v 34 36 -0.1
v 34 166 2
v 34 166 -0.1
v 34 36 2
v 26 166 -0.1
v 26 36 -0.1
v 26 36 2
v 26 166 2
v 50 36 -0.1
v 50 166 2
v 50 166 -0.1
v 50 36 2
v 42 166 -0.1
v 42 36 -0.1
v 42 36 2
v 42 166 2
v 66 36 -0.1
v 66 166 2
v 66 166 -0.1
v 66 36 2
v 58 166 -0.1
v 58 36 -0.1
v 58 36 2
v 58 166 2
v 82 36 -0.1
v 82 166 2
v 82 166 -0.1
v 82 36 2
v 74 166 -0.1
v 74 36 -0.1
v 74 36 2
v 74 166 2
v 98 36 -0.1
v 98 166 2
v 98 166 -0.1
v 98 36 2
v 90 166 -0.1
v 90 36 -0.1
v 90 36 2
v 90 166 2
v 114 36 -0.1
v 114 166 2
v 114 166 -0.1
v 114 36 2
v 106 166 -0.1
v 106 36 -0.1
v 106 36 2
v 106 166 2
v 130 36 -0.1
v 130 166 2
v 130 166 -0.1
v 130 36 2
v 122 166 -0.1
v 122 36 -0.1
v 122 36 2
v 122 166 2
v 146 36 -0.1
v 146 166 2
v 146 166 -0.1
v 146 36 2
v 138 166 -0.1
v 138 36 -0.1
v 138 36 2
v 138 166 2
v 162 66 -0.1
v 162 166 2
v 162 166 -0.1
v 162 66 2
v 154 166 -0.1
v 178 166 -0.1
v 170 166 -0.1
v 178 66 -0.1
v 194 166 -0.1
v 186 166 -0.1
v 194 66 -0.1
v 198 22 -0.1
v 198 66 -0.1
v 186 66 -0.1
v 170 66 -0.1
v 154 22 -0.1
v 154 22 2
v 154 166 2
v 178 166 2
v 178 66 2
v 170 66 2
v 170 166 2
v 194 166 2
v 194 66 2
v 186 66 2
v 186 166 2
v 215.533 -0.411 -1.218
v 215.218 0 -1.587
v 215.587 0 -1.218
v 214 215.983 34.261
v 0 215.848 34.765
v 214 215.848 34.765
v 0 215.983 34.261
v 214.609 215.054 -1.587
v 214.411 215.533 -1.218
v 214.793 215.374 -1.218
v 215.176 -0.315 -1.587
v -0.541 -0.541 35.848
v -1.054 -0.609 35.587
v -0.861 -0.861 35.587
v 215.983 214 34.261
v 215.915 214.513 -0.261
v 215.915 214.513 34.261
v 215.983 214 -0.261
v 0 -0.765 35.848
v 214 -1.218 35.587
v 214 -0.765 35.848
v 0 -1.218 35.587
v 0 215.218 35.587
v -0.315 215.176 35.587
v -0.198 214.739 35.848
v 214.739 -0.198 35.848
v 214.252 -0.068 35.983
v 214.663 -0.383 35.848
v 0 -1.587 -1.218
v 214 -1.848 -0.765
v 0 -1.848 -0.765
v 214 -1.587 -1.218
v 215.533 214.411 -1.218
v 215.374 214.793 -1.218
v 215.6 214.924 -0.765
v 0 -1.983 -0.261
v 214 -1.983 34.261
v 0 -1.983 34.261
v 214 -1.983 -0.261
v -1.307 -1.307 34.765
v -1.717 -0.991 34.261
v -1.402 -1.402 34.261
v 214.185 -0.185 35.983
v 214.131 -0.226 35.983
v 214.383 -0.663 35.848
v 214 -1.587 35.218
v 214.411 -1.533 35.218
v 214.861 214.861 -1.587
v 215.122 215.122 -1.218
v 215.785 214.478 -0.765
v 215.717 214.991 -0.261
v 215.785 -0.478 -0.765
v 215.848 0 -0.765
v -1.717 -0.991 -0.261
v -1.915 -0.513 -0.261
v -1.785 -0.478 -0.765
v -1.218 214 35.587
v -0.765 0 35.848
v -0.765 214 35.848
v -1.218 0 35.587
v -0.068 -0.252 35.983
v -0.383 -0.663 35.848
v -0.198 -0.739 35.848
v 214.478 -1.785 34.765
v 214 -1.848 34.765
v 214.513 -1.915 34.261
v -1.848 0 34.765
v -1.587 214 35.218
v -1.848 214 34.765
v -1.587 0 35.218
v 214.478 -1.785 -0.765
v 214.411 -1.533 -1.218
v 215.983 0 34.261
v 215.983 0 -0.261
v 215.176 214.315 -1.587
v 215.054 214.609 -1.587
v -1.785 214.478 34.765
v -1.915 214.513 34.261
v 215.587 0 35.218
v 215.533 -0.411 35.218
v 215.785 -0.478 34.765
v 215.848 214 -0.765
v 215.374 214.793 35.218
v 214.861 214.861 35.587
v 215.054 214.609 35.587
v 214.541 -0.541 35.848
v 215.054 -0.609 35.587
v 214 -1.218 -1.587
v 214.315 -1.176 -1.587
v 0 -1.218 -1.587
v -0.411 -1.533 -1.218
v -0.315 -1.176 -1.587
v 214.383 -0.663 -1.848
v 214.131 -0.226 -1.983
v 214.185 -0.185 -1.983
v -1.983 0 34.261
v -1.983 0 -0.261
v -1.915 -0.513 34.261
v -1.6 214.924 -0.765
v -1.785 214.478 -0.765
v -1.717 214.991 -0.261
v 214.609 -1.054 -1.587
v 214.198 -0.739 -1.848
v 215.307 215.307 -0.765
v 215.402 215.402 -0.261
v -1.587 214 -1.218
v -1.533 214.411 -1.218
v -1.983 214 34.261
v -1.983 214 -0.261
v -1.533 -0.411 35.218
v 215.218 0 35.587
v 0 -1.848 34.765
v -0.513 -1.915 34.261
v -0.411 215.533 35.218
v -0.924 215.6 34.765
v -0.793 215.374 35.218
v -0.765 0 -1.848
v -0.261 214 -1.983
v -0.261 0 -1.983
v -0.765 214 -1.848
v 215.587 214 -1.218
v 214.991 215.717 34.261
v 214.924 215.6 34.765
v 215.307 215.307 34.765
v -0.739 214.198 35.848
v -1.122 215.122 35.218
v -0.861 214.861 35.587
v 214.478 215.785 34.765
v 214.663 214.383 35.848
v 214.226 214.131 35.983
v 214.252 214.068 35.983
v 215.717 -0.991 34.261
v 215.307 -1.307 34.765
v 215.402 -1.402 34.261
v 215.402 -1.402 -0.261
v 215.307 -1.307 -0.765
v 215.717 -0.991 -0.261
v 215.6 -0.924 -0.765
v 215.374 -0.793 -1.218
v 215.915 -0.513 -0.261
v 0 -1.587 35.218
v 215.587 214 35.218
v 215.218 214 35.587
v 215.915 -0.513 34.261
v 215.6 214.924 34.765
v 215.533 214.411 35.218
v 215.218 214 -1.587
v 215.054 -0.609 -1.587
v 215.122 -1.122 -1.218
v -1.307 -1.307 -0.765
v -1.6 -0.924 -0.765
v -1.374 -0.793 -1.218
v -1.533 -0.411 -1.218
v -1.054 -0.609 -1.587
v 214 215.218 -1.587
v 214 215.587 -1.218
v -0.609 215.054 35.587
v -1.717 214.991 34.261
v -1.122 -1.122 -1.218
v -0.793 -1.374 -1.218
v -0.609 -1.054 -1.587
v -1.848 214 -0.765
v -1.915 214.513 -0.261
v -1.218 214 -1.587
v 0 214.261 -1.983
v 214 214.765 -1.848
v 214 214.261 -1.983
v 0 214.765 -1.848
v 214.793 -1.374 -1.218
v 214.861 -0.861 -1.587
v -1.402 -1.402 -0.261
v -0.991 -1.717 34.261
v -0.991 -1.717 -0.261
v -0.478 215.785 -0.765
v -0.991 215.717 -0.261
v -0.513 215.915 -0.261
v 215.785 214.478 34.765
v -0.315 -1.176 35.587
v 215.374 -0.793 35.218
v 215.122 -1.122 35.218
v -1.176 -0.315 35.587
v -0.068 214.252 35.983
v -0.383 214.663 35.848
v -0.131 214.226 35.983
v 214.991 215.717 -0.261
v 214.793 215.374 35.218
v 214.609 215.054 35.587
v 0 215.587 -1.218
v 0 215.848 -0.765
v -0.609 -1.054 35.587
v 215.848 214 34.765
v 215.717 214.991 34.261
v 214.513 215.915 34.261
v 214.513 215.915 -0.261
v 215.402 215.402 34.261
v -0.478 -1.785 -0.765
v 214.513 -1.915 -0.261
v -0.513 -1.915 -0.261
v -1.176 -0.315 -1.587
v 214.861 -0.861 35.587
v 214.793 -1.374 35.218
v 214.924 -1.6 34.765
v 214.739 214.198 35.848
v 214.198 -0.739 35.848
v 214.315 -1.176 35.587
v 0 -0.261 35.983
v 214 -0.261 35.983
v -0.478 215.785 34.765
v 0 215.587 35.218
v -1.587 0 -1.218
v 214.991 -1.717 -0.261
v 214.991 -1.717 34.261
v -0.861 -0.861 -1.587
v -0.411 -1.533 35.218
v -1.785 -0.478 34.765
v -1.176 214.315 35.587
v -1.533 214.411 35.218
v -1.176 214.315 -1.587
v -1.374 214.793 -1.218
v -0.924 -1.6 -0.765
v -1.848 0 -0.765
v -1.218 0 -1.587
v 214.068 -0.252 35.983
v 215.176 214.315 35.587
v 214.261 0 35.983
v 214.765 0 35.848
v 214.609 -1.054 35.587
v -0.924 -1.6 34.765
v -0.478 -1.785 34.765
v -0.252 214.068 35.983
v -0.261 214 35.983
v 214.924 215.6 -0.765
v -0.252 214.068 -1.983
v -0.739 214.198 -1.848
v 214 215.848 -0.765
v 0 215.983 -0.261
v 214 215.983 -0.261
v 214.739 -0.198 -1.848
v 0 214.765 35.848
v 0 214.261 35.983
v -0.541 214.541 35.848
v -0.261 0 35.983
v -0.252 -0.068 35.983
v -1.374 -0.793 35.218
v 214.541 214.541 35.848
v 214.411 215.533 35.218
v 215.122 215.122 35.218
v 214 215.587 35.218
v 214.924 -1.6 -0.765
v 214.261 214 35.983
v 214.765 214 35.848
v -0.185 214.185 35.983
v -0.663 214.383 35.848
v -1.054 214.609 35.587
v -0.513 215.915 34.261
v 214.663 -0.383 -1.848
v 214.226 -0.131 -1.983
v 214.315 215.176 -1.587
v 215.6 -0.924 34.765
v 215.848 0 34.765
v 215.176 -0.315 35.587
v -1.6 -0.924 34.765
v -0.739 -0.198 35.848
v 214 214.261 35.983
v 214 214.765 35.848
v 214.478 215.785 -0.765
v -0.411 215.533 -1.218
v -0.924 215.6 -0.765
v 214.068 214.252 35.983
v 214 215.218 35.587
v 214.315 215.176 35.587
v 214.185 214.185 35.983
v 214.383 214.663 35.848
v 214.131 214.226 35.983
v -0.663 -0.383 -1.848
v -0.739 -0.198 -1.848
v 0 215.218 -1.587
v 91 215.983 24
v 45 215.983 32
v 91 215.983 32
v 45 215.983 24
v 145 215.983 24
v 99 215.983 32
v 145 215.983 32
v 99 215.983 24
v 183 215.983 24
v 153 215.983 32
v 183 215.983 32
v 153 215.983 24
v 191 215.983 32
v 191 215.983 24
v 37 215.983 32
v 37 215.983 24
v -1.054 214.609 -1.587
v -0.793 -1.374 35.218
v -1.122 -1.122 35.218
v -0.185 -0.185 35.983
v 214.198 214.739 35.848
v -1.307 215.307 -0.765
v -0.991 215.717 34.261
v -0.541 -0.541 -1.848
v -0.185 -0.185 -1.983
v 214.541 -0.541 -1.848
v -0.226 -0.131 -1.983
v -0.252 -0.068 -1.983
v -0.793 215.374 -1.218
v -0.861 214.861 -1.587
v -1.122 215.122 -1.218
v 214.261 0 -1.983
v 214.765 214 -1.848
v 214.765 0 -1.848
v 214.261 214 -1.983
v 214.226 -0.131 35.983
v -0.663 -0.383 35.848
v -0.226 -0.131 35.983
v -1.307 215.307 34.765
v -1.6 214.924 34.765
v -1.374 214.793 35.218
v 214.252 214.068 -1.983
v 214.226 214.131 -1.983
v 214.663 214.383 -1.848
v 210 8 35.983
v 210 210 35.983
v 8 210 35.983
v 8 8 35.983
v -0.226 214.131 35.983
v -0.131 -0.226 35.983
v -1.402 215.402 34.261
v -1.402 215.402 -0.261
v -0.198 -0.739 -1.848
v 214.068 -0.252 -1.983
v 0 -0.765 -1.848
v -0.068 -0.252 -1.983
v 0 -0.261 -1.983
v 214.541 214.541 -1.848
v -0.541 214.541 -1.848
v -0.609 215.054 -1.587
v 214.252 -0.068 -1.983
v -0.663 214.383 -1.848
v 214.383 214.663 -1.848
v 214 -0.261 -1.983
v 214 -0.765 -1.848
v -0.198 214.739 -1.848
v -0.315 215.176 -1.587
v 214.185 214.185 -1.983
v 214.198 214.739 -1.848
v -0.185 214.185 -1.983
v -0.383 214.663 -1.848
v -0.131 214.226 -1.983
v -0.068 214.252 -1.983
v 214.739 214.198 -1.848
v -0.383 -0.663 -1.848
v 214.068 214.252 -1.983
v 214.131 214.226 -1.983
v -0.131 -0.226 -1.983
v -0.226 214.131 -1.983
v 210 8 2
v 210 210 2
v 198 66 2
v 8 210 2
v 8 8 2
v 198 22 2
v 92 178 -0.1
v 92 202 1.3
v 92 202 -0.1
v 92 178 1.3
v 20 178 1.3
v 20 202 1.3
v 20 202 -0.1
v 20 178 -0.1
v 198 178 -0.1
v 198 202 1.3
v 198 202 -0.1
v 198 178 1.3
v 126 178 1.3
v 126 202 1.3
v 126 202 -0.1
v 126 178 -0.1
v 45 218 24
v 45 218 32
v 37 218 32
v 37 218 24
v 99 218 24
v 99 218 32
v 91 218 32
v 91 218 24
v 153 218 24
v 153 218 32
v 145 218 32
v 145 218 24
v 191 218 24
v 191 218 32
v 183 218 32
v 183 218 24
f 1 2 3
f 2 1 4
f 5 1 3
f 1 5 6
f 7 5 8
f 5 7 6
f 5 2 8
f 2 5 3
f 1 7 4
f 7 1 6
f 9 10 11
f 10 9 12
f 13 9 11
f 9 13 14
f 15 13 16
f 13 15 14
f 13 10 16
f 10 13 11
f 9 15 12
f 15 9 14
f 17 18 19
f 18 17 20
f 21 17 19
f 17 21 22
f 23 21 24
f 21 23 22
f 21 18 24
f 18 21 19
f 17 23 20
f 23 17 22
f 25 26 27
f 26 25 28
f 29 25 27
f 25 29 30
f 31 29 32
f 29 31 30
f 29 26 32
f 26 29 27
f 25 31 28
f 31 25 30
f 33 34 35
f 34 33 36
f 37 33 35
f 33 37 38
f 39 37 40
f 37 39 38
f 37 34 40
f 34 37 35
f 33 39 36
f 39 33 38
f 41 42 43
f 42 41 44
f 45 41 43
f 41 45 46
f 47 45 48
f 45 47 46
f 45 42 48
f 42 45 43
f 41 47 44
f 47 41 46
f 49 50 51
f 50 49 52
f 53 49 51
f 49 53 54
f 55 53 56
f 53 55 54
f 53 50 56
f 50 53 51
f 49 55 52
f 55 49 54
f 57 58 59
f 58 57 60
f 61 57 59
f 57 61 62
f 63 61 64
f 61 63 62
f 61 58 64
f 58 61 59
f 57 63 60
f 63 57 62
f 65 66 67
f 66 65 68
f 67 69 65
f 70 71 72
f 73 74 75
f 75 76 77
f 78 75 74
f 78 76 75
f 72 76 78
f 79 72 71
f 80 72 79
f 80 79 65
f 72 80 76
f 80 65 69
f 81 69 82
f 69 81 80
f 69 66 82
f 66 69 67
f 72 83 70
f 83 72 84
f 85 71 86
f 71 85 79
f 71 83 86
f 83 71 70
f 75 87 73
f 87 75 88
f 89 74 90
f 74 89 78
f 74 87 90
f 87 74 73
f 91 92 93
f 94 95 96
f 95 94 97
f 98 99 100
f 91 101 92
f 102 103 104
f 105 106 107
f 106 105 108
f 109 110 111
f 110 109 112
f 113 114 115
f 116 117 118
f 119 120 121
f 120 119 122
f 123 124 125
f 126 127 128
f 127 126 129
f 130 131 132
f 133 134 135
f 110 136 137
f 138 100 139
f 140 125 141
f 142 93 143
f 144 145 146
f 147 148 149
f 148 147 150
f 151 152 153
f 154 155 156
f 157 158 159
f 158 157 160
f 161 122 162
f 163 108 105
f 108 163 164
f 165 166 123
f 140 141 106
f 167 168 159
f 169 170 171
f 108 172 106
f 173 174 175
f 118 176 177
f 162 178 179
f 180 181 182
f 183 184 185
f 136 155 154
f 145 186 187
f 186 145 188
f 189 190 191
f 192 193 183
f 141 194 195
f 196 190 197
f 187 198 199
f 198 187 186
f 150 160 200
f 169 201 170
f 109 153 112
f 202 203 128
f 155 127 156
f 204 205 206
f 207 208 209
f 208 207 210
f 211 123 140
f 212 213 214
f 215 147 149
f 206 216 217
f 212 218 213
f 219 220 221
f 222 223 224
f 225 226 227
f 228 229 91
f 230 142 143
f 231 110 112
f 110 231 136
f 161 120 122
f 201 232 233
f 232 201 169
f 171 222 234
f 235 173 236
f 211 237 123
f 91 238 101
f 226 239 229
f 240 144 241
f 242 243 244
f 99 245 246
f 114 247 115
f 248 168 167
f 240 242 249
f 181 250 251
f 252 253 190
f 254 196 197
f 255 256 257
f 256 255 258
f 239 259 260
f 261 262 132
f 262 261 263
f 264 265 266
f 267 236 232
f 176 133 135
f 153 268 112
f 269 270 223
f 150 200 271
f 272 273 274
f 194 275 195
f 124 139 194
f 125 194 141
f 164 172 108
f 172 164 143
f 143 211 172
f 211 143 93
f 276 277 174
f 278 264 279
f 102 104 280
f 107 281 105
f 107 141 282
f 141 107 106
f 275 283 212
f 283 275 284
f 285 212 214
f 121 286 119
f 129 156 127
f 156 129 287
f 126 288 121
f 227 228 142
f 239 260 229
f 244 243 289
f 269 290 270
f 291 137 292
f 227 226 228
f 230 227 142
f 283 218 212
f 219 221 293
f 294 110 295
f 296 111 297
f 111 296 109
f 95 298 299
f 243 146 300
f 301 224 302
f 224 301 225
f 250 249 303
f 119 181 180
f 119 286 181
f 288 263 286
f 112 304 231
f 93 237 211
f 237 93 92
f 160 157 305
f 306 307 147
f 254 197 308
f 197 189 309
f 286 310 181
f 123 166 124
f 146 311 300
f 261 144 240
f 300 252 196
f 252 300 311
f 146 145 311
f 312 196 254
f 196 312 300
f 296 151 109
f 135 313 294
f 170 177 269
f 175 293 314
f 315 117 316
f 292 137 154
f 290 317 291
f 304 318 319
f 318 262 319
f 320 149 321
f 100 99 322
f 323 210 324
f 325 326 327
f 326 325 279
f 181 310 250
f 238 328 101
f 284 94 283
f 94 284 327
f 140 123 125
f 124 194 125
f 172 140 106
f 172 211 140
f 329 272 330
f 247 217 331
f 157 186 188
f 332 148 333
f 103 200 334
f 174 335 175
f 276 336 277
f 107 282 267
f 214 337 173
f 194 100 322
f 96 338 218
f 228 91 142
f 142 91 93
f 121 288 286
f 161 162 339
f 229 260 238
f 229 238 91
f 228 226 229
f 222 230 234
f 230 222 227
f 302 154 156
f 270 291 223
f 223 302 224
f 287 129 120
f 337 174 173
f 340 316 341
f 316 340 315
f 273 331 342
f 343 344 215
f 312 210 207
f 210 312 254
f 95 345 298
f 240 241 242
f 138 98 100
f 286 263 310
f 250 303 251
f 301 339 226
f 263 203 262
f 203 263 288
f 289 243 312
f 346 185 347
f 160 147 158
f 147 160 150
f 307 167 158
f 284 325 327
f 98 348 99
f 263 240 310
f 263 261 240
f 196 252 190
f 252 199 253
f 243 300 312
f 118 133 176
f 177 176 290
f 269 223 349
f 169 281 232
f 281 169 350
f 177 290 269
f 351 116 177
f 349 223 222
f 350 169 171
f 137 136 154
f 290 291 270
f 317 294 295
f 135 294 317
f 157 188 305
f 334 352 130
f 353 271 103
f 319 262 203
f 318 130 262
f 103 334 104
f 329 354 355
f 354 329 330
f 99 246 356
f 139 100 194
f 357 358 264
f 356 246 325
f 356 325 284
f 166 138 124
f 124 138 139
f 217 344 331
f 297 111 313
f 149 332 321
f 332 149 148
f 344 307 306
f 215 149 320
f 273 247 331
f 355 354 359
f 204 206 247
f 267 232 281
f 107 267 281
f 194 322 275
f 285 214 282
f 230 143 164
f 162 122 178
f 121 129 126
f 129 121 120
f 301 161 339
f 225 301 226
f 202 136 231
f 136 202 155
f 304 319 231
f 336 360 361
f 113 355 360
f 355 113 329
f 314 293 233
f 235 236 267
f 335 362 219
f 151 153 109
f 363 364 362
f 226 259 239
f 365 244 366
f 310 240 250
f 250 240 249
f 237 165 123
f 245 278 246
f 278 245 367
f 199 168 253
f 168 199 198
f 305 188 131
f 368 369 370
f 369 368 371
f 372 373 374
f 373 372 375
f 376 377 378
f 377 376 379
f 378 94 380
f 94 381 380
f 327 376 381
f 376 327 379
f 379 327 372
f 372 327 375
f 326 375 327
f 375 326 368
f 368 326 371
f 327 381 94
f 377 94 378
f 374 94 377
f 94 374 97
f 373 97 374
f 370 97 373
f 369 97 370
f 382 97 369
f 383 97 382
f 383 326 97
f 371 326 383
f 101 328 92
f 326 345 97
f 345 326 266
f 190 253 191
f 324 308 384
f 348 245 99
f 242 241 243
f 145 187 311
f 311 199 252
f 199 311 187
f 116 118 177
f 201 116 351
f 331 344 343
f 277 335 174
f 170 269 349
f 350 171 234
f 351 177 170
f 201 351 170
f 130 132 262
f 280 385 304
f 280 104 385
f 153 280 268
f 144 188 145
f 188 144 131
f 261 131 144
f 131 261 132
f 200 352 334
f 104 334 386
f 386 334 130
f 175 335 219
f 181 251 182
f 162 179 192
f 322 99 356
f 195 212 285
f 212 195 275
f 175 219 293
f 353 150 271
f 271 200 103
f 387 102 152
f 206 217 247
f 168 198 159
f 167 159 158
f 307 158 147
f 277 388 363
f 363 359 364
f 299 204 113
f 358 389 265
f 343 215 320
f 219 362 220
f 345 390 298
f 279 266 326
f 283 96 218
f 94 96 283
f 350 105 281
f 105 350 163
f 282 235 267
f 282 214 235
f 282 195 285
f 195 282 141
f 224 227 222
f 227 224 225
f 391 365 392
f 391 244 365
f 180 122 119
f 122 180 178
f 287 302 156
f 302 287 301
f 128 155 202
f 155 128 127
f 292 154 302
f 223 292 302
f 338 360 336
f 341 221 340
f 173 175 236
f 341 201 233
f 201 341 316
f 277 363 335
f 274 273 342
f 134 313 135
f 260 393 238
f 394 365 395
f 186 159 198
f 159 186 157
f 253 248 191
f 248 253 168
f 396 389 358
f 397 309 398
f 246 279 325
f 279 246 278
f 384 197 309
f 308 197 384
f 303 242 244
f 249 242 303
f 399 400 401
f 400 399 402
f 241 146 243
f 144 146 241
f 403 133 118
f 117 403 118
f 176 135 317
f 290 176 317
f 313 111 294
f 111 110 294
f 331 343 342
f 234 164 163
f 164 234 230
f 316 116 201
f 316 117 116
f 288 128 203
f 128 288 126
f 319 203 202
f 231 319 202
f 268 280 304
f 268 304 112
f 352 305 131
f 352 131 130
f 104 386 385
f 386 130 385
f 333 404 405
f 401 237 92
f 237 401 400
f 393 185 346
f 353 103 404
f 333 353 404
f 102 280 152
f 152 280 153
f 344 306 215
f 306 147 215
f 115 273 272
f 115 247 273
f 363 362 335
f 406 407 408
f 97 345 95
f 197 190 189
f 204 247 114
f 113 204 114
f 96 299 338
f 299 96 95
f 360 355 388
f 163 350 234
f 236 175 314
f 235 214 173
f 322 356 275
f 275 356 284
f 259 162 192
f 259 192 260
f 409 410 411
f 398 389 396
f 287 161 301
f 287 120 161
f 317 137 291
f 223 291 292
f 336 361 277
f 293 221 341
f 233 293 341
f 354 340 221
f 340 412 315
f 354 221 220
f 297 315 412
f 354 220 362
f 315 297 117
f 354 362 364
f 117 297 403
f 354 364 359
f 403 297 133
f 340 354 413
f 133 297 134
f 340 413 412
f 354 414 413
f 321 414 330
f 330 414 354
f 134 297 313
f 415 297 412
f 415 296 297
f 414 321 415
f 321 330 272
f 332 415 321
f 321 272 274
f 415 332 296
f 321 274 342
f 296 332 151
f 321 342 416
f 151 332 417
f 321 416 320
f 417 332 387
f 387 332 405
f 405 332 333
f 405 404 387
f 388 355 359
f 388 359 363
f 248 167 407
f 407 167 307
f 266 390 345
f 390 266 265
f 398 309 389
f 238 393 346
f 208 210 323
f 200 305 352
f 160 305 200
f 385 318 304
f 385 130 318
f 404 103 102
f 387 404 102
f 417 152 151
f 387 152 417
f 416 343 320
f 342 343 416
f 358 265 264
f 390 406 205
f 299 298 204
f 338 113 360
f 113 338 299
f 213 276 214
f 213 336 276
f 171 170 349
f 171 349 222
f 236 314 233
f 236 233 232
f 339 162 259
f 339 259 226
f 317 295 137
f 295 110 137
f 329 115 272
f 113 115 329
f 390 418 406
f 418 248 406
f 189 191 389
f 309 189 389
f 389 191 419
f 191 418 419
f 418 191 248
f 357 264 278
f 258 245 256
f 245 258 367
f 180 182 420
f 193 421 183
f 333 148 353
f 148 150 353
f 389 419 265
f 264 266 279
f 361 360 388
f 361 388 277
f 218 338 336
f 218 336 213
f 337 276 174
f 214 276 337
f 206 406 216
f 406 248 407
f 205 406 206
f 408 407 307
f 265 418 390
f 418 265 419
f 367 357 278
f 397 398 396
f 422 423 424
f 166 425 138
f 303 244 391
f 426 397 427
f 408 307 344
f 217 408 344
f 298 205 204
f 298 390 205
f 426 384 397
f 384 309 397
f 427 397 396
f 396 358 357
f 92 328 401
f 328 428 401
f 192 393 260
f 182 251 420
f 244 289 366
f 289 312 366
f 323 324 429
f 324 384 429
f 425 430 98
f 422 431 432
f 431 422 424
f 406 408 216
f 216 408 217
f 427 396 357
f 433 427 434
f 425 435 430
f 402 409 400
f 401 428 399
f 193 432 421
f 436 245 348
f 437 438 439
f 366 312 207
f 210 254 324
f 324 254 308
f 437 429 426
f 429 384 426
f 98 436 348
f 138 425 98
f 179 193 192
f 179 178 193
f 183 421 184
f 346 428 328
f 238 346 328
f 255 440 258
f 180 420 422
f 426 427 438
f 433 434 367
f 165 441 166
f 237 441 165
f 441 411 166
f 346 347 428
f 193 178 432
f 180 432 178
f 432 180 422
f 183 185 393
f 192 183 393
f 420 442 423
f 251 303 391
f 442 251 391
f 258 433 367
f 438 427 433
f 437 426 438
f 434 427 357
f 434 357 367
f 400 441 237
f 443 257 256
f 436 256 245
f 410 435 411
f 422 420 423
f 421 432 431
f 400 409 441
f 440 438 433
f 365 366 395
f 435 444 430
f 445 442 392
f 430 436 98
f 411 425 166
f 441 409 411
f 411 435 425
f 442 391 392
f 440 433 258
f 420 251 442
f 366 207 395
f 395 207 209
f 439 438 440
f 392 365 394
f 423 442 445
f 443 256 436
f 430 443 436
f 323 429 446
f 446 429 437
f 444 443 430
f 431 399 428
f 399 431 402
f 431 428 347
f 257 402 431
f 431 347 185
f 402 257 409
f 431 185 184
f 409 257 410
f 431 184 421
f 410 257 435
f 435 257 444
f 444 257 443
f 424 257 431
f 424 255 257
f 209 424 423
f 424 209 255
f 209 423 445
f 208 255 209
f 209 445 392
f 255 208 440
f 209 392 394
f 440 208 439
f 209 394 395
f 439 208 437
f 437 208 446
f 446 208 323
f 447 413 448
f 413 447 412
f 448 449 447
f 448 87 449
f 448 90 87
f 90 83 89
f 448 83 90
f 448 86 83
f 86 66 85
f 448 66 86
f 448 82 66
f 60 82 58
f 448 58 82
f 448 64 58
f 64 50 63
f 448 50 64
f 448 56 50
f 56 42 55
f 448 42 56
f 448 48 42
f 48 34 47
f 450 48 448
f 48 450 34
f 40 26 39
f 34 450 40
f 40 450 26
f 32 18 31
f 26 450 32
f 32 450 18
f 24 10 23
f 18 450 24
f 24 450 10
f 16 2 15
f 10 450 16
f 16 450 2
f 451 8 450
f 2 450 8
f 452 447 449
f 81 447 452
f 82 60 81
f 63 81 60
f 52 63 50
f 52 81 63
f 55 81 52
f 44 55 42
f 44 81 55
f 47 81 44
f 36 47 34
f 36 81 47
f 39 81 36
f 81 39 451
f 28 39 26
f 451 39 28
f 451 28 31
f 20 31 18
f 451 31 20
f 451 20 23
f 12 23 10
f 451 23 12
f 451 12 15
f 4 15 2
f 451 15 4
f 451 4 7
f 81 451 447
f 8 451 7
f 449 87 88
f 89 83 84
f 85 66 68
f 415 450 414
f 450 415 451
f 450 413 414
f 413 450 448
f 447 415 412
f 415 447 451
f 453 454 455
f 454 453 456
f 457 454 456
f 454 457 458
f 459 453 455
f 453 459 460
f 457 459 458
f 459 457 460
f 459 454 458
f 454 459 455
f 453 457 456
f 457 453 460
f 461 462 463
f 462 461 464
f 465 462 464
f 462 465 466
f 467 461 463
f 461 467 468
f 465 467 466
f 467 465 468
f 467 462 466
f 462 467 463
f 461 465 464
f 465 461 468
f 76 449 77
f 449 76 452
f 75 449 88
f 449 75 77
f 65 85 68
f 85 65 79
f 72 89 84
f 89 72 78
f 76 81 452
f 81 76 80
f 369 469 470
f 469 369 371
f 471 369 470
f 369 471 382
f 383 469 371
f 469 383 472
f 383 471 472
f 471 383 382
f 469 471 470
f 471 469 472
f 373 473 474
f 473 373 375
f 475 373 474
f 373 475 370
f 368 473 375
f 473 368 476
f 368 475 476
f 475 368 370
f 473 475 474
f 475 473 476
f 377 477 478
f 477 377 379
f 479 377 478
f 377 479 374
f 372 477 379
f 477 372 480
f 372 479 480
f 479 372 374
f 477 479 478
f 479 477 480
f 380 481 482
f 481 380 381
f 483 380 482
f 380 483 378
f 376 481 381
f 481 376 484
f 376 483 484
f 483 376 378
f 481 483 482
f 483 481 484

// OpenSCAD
// file: ../../f1_1/cad/common.scad
// Shared constants and primitives for F1.1 mechanical design.

filament_diameter = 1.75;
ptfe_inner_diameter = 2.0;
mount_hole_diameter = 3.2;
mount_slot_width = 3.5;
mount_slot_length = 10.0;

module rounded_block(size_vec, radius = 2) {
    x = size_vec[0];
    y = size_vec[1];
    z = size_vec[2];

    minkowski() {
        cube([x - (2 * radius), y - (2 * radius), z - (2 * radius)], center = false);
        sphere(r = radius, $fn = 24);
    }
}

module m3_hole(height = 12, diameter = mount_hole_diameter) {
    cylinder(h = height, d = diameter, center = false, $fn = 32);
}

module slot_hole(length = mount_slot_length, width = mount_slot_width, height = 8) {
    hull() {
        translate([0, 0, 0]) {
            cylinder(h = height, d = width, center = false, $fn = 24);
        }
        translate([length, 0, 0]) {
            cylinder(h = height, d = width, center = false, $fn = 24);
        }
    }
}

module filament_channel(length = 30, diameter = ptfe_inner_diameter, axis = "x") {
    if (axis == "x") {
        rotate([0, 90, 0]) {
            cylinder(h = length, d = diameter, center = true, $fn = 36);
        }
    } else if (axis == "y") {
        rotate([90, 0, 0]) {
            cylinder(h = length, d = diameter, center = true, $fn = 36);
        }
    } else {
        cylinder(h = length, d = diameter, center = true, $fn = 36);
    }
}

module pc4_m6_fitting_port() {
    difference() {
        cylinder(h = 8, d = 8, center = false, $fn = 24);
        translate([0, 0, -0.5]) {
            cylinder(h = 9, d = 4.6, center = false, $fn = 24);
        }
    }
}

module modular_rail(width = 80, depth = 12, length = 210) {
    difference() {
        cube([length, width, depth], center = false);

        for (slot_x = [15 : 20 : length - 15]) {
            translate([slot_x, width * 0.5, 0]) {
                slot_hole(length = mount_slot_length, width = mount_slot_width, height = depth + 1);
            }
        }
    }
}
// main file
use <../../f1_1/cad/common.scad>;

// Top shell with ventilation, labels, and optional HEPA frame pocket.

module enclosure_top() {
    difference() {
        rounded_block([218, 218, 38], radius = 2);

        // Inner clearance.
        translate([8, 8, 2]) {
            cube([202, 202, 34], center = false);
        }

        // Vent slots across splice and electronics zones.
        for (x = [26 : 16 : 186]) {
            translate([x, 36, -0.1]) {
                cube([8, 130, 4], center = false);
            }
        }

        // Service label recesses.
        translate([20, 178, -0.1]) {
            cube([72, 24, 1.4], center = false);
        }
        translate([126, 178, -0.1]) {
            cube([72, 24, 1.4], center = false);
        }

        // Optional HEPA mount opening.
        translate([154, 22, -0.1]) {
            cube([44, 44, 3.5], center = false);
        }
    }

    // Snap-fit pockets for bottom tabs.
    for (x = [36, 90, 144, 182]) {
        translate([x + 1, 0, 24]) {
            cube([8, 3, 8], center = false);
        }
        translate([x + 1, 215, 24]) {
            cube([8, 3, 8], center = false);
        }
    }
}

enclosure_top();
